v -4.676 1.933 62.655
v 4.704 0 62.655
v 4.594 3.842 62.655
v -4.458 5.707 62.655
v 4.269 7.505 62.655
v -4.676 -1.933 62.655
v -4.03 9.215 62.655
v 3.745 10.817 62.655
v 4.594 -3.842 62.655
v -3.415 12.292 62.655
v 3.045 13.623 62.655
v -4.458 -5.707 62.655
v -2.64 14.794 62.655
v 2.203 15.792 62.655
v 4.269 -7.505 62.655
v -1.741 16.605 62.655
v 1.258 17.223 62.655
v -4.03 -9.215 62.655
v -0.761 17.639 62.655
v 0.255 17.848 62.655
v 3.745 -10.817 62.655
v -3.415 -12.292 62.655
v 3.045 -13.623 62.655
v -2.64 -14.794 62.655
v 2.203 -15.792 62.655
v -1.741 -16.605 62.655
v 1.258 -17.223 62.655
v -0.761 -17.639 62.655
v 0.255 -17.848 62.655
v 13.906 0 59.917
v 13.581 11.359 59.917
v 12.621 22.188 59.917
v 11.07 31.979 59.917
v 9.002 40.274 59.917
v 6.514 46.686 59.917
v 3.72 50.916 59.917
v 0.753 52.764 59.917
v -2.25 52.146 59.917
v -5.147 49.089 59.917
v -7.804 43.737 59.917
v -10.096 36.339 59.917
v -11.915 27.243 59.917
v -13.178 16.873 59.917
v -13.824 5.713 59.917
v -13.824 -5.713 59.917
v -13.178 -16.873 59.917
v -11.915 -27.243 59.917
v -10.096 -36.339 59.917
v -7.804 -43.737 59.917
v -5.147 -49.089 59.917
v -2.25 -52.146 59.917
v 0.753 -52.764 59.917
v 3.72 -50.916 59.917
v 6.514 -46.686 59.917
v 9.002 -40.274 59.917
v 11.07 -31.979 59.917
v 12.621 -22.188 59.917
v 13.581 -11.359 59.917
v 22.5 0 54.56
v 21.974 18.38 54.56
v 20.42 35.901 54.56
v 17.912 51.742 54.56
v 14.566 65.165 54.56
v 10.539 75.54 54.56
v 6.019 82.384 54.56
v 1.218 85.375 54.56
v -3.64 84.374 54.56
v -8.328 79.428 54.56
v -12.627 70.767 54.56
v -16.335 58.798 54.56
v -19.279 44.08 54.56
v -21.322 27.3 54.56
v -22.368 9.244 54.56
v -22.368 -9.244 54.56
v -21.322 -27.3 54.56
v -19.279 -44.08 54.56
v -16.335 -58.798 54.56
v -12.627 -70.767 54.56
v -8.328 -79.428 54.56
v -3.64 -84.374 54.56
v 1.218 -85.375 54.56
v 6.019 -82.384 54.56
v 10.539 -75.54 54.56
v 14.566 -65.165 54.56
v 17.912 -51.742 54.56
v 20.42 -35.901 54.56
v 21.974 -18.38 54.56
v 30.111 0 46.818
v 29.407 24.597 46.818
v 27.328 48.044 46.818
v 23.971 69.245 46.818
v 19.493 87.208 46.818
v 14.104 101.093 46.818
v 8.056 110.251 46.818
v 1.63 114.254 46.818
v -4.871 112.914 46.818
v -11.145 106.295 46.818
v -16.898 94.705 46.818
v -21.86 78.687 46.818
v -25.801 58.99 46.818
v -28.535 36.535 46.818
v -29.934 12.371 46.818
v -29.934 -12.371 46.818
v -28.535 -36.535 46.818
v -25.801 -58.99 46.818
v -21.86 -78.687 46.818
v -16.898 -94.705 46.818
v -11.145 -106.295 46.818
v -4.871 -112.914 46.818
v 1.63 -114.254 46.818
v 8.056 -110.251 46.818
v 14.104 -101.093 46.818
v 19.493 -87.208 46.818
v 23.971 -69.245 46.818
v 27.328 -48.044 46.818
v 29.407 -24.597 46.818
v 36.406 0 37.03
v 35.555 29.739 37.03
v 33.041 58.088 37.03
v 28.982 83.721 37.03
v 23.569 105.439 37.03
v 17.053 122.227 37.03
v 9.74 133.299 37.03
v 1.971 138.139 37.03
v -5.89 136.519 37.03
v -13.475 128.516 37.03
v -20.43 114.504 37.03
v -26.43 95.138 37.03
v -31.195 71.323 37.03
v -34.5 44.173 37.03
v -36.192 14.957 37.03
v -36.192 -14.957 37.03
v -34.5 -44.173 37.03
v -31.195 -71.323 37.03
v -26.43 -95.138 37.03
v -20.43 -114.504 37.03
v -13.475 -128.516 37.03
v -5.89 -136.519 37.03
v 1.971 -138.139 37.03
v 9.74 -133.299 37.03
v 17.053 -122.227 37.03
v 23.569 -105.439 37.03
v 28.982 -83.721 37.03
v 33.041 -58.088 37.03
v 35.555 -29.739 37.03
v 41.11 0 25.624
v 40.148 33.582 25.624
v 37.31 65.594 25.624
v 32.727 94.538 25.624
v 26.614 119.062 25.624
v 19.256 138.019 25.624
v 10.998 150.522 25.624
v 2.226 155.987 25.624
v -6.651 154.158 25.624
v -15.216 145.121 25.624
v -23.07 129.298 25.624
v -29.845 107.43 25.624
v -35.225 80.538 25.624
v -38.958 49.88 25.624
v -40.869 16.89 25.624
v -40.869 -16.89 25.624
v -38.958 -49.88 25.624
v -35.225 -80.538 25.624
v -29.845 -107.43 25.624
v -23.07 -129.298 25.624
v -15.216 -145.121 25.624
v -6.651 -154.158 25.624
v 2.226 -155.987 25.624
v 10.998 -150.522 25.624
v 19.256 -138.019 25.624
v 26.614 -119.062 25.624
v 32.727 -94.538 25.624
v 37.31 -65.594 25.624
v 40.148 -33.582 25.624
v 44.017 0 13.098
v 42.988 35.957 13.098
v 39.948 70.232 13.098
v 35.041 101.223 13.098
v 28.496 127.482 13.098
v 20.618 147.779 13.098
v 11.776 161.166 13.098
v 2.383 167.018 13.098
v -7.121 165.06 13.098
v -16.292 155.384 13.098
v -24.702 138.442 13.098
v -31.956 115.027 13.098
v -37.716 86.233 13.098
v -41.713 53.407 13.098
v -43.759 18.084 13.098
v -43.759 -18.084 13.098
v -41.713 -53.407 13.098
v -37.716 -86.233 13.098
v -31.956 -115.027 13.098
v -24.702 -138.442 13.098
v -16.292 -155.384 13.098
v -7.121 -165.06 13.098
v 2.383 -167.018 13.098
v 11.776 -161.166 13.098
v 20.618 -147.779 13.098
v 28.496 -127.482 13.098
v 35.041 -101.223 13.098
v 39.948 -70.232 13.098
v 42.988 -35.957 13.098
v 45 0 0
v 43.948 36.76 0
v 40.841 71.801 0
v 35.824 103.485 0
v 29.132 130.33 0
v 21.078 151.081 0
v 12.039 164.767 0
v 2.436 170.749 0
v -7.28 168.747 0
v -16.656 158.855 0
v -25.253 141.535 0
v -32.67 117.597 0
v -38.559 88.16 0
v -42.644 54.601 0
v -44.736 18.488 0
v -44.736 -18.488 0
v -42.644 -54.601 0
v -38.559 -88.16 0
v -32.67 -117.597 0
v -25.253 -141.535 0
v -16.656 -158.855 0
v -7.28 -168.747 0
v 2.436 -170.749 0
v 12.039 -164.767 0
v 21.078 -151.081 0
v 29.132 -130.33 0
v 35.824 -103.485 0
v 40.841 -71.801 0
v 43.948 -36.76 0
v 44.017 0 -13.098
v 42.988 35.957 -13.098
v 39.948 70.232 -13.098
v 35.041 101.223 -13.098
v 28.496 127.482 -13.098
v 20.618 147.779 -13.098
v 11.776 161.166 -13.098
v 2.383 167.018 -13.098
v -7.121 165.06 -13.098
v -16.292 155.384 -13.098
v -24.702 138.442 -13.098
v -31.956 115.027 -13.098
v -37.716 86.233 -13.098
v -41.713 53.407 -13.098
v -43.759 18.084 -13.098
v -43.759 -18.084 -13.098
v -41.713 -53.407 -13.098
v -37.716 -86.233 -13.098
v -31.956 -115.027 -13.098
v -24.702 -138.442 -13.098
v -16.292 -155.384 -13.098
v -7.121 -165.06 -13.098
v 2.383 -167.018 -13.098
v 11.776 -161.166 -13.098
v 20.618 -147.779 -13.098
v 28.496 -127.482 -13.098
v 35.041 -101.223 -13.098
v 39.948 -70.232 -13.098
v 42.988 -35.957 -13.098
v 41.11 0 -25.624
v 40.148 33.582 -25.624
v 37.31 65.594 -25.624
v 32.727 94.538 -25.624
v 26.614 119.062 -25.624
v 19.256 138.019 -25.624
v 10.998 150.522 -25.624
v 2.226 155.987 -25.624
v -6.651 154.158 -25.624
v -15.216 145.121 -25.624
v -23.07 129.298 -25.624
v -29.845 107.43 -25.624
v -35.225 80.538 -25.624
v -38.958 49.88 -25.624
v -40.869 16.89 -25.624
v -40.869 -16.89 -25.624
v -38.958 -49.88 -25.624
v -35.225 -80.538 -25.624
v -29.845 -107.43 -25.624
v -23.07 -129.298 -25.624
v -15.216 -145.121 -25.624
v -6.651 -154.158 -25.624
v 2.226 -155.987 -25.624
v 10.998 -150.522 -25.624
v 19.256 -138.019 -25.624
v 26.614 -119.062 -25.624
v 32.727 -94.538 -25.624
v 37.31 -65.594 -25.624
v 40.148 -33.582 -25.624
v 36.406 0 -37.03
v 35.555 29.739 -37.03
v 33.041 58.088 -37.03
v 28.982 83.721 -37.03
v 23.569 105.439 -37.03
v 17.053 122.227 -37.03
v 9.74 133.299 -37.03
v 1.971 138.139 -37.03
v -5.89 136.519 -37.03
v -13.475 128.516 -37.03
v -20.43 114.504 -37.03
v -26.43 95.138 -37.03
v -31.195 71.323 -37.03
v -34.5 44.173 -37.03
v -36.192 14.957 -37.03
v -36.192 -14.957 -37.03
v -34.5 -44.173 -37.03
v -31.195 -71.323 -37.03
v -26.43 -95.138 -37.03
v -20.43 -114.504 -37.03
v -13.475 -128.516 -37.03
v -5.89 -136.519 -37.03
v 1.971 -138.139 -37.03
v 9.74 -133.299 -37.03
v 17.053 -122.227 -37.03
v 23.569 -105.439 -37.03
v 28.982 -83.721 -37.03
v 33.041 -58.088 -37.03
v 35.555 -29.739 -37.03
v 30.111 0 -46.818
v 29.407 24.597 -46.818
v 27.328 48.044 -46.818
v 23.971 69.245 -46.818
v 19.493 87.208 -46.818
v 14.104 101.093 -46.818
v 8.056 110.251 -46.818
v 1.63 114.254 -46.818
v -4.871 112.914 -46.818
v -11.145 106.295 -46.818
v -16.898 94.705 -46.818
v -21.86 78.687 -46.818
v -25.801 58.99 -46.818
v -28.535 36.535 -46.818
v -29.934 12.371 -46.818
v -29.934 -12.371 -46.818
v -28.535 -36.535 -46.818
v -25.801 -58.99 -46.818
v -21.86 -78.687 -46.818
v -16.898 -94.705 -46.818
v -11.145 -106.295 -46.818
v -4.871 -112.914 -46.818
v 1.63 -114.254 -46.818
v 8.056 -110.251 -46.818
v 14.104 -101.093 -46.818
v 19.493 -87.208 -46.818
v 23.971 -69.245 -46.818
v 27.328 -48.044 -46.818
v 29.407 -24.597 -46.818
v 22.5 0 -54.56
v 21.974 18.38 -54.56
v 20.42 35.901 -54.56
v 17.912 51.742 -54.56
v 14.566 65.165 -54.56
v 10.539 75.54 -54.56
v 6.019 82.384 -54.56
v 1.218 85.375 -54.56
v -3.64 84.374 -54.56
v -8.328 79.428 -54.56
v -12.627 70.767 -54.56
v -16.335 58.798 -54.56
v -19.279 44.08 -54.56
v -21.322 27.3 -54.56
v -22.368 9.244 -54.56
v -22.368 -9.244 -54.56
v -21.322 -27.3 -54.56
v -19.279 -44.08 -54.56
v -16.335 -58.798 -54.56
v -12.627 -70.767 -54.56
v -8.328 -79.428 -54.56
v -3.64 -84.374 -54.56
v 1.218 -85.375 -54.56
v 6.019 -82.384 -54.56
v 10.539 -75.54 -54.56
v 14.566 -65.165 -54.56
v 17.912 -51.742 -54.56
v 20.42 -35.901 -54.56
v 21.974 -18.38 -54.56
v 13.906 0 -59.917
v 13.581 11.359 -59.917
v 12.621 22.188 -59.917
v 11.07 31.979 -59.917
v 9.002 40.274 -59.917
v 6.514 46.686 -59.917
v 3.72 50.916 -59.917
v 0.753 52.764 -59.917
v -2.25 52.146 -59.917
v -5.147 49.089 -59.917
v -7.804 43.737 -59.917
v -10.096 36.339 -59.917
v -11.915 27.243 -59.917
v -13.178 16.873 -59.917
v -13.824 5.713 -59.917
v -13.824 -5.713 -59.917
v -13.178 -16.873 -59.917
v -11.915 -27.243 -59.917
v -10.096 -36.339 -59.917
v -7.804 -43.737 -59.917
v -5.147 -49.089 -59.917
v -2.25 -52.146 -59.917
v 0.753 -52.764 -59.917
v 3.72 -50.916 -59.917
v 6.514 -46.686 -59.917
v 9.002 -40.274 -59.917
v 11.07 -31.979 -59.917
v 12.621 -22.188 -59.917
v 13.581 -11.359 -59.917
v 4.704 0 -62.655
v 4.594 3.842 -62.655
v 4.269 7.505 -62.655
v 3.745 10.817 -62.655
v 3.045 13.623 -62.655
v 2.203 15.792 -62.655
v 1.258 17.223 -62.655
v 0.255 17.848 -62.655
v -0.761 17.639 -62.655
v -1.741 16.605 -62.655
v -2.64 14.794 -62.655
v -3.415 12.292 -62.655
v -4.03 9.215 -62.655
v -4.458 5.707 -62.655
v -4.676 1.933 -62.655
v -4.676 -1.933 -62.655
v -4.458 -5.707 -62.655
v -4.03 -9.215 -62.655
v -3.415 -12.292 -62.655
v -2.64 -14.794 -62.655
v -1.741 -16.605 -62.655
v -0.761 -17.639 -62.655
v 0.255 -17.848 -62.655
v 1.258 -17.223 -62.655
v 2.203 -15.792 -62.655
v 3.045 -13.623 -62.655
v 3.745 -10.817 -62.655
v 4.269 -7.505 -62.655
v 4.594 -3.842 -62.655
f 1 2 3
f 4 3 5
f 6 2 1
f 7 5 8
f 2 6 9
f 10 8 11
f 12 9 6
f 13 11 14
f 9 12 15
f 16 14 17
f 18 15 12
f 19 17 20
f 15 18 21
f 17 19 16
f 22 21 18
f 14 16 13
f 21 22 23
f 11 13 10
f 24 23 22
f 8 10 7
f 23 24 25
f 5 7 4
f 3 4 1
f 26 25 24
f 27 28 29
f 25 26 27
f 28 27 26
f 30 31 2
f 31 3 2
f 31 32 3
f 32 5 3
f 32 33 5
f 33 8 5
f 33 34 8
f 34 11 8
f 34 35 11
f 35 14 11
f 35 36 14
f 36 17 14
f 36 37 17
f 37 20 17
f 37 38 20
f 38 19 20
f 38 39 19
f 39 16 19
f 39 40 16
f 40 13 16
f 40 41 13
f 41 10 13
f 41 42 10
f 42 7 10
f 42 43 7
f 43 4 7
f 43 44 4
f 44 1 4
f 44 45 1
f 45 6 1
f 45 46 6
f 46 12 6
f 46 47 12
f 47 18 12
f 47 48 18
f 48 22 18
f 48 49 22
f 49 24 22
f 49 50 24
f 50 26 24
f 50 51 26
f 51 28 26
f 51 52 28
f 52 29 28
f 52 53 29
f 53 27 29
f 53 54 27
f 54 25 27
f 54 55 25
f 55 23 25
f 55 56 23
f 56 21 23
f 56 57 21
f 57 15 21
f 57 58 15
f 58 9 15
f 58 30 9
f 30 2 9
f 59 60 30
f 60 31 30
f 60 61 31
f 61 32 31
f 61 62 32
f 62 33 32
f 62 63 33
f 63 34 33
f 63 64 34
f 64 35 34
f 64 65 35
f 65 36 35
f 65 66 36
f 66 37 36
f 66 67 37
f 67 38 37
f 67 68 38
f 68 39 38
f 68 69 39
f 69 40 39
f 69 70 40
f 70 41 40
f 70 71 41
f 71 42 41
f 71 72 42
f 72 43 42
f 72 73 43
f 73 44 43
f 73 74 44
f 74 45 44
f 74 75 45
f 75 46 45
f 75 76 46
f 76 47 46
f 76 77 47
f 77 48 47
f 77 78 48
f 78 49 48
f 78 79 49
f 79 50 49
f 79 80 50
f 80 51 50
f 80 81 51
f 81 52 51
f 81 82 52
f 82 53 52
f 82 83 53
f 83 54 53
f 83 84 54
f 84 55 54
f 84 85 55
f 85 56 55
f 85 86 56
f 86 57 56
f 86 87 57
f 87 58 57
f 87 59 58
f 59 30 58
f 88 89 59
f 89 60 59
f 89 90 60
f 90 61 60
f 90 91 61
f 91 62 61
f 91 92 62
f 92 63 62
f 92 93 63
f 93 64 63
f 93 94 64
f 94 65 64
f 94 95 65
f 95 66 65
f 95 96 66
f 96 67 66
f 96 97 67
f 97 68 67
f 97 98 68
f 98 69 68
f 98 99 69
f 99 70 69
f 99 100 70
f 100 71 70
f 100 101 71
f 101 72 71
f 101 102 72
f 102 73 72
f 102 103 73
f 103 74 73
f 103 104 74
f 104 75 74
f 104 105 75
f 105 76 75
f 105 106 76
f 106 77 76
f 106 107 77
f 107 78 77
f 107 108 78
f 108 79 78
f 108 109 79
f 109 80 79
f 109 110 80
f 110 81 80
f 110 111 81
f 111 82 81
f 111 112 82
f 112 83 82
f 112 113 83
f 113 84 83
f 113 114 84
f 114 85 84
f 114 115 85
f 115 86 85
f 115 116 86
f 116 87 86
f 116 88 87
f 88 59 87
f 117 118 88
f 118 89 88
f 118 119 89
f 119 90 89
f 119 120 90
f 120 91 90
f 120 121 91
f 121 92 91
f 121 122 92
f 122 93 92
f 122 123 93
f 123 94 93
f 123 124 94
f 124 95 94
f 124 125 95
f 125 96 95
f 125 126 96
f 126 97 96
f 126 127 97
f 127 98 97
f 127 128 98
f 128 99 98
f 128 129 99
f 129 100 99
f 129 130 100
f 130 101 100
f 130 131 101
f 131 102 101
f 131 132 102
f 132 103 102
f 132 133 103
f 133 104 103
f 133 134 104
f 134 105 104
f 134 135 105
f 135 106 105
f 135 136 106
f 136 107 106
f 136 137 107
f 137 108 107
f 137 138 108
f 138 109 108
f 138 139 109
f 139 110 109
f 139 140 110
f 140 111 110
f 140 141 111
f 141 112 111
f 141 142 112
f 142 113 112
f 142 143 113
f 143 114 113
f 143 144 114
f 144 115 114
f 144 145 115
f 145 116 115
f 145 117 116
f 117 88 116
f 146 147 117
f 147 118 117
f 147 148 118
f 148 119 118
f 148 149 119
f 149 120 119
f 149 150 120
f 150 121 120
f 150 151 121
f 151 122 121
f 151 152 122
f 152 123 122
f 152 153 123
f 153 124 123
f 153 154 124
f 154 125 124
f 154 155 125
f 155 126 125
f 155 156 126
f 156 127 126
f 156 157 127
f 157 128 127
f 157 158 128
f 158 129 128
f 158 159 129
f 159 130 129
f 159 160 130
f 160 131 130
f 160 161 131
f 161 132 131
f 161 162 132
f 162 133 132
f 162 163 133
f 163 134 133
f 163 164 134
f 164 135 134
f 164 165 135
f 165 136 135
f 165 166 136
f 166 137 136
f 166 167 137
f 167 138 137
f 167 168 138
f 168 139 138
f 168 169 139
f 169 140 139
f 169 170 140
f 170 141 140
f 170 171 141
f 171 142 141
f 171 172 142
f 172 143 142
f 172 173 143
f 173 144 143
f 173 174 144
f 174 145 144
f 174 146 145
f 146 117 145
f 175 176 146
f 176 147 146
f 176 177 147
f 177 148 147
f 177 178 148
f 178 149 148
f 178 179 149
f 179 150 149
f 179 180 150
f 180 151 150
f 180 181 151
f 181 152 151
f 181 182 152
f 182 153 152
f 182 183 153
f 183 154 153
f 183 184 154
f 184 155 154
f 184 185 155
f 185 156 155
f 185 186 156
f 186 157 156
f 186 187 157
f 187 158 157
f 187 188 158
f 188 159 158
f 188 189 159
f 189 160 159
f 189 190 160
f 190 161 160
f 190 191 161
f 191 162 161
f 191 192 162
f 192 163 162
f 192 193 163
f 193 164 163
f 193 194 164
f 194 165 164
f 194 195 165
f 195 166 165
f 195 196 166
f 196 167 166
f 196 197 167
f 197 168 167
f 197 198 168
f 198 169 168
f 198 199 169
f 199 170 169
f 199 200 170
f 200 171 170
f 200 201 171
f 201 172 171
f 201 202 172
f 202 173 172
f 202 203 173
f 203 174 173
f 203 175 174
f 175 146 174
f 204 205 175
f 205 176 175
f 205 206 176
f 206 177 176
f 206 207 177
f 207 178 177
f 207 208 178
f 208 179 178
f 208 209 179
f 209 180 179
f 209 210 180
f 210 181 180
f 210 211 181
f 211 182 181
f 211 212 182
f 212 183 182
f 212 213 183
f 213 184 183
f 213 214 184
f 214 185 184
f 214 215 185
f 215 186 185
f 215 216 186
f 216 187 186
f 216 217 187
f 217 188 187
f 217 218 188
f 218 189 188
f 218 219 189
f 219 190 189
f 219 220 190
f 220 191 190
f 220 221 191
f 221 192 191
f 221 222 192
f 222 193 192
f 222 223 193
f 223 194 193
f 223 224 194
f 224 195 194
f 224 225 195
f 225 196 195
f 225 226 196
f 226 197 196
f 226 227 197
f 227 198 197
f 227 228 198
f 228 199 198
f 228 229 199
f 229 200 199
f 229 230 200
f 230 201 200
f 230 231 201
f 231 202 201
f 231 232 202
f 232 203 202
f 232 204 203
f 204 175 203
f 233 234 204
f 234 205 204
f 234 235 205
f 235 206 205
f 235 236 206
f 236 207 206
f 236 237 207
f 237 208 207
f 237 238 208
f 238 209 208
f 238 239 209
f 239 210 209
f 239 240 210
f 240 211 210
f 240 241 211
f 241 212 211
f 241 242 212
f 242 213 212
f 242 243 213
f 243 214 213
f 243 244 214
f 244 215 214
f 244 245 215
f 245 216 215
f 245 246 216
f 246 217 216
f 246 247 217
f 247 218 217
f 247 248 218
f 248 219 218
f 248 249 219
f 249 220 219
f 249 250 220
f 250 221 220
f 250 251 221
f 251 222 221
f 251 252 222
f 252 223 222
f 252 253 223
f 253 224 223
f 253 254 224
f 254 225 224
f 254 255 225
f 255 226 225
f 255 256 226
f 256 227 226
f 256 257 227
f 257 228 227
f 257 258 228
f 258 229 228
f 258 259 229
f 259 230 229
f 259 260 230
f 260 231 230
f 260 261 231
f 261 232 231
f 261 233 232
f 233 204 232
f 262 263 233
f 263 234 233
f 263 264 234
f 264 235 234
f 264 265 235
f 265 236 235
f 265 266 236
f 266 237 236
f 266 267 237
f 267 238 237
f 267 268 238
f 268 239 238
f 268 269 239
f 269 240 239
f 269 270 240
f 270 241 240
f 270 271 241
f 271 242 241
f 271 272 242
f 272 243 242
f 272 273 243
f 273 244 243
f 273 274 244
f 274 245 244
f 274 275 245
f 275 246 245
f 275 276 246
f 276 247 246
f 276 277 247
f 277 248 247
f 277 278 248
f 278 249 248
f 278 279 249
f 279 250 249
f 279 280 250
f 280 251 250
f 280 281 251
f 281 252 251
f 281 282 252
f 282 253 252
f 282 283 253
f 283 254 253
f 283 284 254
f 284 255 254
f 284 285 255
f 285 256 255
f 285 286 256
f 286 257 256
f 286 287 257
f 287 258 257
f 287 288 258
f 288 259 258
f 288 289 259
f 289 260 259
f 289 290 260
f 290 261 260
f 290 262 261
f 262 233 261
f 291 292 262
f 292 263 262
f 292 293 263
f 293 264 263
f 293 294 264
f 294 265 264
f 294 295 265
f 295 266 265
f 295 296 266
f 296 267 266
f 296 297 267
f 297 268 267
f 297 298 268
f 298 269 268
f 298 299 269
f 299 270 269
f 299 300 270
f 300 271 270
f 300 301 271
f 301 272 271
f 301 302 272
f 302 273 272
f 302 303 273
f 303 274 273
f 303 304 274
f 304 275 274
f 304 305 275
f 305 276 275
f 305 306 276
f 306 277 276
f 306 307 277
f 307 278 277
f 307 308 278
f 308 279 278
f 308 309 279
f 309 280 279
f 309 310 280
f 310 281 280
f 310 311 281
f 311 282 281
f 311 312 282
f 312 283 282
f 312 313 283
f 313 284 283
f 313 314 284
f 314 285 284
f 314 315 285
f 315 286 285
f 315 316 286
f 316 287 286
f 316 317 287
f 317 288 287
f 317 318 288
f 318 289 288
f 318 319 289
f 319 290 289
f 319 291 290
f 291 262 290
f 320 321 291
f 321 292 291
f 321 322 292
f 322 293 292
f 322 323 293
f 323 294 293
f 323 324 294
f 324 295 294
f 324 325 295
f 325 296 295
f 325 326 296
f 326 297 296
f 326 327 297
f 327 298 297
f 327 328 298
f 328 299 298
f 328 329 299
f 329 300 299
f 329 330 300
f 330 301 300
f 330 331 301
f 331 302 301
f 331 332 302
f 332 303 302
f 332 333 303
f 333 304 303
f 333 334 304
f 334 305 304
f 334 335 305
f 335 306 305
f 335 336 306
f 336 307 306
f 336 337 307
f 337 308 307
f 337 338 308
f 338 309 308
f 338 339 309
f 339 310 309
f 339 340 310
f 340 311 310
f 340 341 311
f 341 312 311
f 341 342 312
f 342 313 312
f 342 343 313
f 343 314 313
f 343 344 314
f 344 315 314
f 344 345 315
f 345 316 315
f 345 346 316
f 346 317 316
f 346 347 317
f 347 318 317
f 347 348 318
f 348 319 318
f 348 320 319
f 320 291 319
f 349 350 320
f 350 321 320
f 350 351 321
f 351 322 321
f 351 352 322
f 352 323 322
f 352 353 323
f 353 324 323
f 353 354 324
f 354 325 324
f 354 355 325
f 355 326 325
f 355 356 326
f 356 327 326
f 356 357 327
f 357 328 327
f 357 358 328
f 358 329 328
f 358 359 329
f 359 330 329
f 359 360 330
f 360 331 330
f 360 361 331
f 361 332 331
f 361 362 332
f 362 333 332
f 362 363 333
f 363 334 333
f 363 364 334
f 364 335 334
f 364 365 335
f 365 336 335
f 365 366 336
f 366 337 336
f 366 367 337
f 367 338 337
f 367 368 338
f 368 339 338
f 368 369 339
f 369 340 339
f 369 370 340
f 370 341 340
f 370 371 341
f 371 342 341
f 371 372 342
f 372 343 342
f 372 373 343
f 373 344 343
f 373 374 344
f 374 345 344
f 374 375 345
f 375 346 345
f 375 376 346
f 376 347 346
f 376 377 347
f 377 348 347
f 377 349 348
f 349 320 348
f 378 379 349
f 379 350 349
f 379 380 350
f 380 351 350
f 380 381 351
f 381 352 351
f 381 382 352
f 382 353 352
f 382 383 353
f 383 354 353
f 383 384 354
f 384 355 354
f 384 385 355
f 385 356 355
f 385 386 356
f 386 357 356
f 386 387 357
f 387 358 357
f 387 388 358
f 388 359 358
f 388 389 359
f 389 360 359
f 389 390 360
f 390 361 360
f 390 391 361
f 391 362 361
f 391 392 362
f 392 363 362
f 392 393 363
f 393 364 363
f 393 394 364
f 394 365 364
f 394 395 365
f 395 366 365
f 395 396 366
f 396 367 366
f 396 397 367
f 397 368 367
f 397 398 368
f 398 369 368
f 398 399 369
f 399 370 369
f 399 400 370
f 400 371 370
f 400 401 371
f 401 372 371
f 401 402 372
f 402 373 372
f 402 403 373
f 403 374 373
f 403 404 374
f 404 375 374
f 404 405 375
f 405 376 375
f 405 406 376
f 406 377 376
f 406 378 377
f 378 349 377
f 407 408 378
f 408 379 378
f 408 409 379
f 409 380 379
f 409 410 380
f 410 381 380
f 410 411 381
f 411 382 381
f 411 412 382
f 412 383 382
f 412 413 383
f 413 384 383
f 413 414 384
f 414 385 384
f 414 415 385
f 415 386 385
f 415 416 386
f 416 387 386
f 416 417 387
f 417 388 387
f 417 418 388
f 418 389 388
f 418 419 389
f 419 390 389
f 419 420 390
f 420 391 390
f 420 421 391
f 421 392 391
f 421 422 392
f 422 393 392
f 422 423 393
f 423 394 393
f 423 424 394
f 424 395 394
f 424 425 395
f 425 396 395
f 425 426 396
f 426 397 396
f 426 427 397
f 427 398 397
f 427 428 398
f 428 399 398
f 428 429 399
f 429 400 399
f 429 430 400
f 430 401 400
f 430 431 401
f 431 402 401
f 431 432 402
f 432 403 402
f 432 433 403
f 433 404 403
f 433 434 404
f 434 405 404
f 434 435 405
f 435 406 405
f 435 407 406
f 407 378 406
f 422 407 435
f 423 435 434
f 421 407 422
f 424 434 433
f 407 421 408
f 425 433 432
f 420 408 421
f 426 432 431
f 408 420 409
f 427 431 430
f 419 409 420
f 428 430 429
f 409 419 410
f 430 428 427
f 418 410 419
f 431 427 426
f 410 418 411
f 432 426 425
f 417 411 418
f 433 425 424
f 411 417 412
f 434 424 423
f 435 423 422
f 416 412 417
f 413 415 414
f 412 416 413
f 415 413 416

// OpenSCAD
// Generated by SolidPython 1.0.1 on 2020-07-29 00:46:47


scale(v = [5, 19, 7]) {
	sphere(r = 9);
}
/***********************************************
*********      SolidPython code:      **********
************************************************
 
# import packages: SolidPython
from solid import *
from solid.utils import *
from itertools import chain, combinations, permutations


class Resize:

    def __init__(self, scad_file):
        self.scad_file = scad_file
        #self.scad_file = import_scad(scad_file)
        # cone/cylinder param:
        self.r1 = 0
        self.r2 = 0
        self.h = 0
        # rectangular prism param:
        self.w = 0
        self.l = 0
        # ellipse param:
        self.r = 0

    # import OpenScad code (file name corresponds to shape)


    # classify shape + parameters
    def assign(self, param1, param2, param3):
        if self.scad_file == 'cone.scad':
            self.r1 = param1
            self.r2 = param2
            self.h = param3
        elif self.scad_file == 'cylinder.scad':
            self.r1 = param1
            self.r2 = param2
            self.h = param3
        elif self.scad_file == 'rectangularPrism.scad':
            self.h = param1
            self.l = param2
            self.w = param3
        else:
            self.r = param1
            self.h = param2

    # resize parameters
    def iterate(self):
        x = range(3, 20, 2)
        i = 1
        if self.scad_file == 'cone.scad':
            tempList = list(permutations(x, 2))
            for temp in tempList:
                param1 = temp[0]
                param2 = temp[1]
                filepath = 'produced_scad_files/' + 'cone' + str(param1) + '_' + str(param2) + '_' + '.scad'
                scad_render_to_file(cylinder(h=param1, r1=param2, r2=0), filepath)

        elif self.scad_file == 'cylinder.scad':
            tempList = list(permutations(x, 3))
            for temp in tempList:
                param1 = temp[0]
                param2 = temp[1]
                filepath = 'produced_scad_files/' + 'cylinder' + str(param1) + '_' + str(param2) + '_' + '.scad'
                scad_render_to_file(cylinder(h=param1, r1=param2, r2=param2), filepath)

        elif self.scad_file == 'rectangularPrism.scad':
            tempList = list(permutations(x, 3))
            for temp in tempList:
                param1 = temp[0]
                param2 = temp[1]
                param3 = temp[2]
                filepath = 'produced_scad_files/' + 'rectangularPrism' + str(param1) + '_' + str(param2) + '_' + str(
                    param3) + '.scad'
                scad_render_to_file(cube(size=(param1, param2, param3)), filepath)

        elif self.scad_file == 'ellipse.scad':
            tempList = list(permutations(x, 4))
            for temp in tempList:
                param1 = temp[0]
                param2 = temp[1]
                param3 = temp[2]
                param4 = temp[3]
                filepath = 'produced_scad_files/' + 'ellipse' + str(param1) + '_' + str(param2) + '_' + str(param3) + '_' + str(param4) + '.scad'
                scad_render_to_file(scale([param1, param2, param3])(sphere(r=param4)), filepath)

    def render_to_scadfile(self):
        scad_render_to_file(scad, 'example.scad') 
 
************************************************/
